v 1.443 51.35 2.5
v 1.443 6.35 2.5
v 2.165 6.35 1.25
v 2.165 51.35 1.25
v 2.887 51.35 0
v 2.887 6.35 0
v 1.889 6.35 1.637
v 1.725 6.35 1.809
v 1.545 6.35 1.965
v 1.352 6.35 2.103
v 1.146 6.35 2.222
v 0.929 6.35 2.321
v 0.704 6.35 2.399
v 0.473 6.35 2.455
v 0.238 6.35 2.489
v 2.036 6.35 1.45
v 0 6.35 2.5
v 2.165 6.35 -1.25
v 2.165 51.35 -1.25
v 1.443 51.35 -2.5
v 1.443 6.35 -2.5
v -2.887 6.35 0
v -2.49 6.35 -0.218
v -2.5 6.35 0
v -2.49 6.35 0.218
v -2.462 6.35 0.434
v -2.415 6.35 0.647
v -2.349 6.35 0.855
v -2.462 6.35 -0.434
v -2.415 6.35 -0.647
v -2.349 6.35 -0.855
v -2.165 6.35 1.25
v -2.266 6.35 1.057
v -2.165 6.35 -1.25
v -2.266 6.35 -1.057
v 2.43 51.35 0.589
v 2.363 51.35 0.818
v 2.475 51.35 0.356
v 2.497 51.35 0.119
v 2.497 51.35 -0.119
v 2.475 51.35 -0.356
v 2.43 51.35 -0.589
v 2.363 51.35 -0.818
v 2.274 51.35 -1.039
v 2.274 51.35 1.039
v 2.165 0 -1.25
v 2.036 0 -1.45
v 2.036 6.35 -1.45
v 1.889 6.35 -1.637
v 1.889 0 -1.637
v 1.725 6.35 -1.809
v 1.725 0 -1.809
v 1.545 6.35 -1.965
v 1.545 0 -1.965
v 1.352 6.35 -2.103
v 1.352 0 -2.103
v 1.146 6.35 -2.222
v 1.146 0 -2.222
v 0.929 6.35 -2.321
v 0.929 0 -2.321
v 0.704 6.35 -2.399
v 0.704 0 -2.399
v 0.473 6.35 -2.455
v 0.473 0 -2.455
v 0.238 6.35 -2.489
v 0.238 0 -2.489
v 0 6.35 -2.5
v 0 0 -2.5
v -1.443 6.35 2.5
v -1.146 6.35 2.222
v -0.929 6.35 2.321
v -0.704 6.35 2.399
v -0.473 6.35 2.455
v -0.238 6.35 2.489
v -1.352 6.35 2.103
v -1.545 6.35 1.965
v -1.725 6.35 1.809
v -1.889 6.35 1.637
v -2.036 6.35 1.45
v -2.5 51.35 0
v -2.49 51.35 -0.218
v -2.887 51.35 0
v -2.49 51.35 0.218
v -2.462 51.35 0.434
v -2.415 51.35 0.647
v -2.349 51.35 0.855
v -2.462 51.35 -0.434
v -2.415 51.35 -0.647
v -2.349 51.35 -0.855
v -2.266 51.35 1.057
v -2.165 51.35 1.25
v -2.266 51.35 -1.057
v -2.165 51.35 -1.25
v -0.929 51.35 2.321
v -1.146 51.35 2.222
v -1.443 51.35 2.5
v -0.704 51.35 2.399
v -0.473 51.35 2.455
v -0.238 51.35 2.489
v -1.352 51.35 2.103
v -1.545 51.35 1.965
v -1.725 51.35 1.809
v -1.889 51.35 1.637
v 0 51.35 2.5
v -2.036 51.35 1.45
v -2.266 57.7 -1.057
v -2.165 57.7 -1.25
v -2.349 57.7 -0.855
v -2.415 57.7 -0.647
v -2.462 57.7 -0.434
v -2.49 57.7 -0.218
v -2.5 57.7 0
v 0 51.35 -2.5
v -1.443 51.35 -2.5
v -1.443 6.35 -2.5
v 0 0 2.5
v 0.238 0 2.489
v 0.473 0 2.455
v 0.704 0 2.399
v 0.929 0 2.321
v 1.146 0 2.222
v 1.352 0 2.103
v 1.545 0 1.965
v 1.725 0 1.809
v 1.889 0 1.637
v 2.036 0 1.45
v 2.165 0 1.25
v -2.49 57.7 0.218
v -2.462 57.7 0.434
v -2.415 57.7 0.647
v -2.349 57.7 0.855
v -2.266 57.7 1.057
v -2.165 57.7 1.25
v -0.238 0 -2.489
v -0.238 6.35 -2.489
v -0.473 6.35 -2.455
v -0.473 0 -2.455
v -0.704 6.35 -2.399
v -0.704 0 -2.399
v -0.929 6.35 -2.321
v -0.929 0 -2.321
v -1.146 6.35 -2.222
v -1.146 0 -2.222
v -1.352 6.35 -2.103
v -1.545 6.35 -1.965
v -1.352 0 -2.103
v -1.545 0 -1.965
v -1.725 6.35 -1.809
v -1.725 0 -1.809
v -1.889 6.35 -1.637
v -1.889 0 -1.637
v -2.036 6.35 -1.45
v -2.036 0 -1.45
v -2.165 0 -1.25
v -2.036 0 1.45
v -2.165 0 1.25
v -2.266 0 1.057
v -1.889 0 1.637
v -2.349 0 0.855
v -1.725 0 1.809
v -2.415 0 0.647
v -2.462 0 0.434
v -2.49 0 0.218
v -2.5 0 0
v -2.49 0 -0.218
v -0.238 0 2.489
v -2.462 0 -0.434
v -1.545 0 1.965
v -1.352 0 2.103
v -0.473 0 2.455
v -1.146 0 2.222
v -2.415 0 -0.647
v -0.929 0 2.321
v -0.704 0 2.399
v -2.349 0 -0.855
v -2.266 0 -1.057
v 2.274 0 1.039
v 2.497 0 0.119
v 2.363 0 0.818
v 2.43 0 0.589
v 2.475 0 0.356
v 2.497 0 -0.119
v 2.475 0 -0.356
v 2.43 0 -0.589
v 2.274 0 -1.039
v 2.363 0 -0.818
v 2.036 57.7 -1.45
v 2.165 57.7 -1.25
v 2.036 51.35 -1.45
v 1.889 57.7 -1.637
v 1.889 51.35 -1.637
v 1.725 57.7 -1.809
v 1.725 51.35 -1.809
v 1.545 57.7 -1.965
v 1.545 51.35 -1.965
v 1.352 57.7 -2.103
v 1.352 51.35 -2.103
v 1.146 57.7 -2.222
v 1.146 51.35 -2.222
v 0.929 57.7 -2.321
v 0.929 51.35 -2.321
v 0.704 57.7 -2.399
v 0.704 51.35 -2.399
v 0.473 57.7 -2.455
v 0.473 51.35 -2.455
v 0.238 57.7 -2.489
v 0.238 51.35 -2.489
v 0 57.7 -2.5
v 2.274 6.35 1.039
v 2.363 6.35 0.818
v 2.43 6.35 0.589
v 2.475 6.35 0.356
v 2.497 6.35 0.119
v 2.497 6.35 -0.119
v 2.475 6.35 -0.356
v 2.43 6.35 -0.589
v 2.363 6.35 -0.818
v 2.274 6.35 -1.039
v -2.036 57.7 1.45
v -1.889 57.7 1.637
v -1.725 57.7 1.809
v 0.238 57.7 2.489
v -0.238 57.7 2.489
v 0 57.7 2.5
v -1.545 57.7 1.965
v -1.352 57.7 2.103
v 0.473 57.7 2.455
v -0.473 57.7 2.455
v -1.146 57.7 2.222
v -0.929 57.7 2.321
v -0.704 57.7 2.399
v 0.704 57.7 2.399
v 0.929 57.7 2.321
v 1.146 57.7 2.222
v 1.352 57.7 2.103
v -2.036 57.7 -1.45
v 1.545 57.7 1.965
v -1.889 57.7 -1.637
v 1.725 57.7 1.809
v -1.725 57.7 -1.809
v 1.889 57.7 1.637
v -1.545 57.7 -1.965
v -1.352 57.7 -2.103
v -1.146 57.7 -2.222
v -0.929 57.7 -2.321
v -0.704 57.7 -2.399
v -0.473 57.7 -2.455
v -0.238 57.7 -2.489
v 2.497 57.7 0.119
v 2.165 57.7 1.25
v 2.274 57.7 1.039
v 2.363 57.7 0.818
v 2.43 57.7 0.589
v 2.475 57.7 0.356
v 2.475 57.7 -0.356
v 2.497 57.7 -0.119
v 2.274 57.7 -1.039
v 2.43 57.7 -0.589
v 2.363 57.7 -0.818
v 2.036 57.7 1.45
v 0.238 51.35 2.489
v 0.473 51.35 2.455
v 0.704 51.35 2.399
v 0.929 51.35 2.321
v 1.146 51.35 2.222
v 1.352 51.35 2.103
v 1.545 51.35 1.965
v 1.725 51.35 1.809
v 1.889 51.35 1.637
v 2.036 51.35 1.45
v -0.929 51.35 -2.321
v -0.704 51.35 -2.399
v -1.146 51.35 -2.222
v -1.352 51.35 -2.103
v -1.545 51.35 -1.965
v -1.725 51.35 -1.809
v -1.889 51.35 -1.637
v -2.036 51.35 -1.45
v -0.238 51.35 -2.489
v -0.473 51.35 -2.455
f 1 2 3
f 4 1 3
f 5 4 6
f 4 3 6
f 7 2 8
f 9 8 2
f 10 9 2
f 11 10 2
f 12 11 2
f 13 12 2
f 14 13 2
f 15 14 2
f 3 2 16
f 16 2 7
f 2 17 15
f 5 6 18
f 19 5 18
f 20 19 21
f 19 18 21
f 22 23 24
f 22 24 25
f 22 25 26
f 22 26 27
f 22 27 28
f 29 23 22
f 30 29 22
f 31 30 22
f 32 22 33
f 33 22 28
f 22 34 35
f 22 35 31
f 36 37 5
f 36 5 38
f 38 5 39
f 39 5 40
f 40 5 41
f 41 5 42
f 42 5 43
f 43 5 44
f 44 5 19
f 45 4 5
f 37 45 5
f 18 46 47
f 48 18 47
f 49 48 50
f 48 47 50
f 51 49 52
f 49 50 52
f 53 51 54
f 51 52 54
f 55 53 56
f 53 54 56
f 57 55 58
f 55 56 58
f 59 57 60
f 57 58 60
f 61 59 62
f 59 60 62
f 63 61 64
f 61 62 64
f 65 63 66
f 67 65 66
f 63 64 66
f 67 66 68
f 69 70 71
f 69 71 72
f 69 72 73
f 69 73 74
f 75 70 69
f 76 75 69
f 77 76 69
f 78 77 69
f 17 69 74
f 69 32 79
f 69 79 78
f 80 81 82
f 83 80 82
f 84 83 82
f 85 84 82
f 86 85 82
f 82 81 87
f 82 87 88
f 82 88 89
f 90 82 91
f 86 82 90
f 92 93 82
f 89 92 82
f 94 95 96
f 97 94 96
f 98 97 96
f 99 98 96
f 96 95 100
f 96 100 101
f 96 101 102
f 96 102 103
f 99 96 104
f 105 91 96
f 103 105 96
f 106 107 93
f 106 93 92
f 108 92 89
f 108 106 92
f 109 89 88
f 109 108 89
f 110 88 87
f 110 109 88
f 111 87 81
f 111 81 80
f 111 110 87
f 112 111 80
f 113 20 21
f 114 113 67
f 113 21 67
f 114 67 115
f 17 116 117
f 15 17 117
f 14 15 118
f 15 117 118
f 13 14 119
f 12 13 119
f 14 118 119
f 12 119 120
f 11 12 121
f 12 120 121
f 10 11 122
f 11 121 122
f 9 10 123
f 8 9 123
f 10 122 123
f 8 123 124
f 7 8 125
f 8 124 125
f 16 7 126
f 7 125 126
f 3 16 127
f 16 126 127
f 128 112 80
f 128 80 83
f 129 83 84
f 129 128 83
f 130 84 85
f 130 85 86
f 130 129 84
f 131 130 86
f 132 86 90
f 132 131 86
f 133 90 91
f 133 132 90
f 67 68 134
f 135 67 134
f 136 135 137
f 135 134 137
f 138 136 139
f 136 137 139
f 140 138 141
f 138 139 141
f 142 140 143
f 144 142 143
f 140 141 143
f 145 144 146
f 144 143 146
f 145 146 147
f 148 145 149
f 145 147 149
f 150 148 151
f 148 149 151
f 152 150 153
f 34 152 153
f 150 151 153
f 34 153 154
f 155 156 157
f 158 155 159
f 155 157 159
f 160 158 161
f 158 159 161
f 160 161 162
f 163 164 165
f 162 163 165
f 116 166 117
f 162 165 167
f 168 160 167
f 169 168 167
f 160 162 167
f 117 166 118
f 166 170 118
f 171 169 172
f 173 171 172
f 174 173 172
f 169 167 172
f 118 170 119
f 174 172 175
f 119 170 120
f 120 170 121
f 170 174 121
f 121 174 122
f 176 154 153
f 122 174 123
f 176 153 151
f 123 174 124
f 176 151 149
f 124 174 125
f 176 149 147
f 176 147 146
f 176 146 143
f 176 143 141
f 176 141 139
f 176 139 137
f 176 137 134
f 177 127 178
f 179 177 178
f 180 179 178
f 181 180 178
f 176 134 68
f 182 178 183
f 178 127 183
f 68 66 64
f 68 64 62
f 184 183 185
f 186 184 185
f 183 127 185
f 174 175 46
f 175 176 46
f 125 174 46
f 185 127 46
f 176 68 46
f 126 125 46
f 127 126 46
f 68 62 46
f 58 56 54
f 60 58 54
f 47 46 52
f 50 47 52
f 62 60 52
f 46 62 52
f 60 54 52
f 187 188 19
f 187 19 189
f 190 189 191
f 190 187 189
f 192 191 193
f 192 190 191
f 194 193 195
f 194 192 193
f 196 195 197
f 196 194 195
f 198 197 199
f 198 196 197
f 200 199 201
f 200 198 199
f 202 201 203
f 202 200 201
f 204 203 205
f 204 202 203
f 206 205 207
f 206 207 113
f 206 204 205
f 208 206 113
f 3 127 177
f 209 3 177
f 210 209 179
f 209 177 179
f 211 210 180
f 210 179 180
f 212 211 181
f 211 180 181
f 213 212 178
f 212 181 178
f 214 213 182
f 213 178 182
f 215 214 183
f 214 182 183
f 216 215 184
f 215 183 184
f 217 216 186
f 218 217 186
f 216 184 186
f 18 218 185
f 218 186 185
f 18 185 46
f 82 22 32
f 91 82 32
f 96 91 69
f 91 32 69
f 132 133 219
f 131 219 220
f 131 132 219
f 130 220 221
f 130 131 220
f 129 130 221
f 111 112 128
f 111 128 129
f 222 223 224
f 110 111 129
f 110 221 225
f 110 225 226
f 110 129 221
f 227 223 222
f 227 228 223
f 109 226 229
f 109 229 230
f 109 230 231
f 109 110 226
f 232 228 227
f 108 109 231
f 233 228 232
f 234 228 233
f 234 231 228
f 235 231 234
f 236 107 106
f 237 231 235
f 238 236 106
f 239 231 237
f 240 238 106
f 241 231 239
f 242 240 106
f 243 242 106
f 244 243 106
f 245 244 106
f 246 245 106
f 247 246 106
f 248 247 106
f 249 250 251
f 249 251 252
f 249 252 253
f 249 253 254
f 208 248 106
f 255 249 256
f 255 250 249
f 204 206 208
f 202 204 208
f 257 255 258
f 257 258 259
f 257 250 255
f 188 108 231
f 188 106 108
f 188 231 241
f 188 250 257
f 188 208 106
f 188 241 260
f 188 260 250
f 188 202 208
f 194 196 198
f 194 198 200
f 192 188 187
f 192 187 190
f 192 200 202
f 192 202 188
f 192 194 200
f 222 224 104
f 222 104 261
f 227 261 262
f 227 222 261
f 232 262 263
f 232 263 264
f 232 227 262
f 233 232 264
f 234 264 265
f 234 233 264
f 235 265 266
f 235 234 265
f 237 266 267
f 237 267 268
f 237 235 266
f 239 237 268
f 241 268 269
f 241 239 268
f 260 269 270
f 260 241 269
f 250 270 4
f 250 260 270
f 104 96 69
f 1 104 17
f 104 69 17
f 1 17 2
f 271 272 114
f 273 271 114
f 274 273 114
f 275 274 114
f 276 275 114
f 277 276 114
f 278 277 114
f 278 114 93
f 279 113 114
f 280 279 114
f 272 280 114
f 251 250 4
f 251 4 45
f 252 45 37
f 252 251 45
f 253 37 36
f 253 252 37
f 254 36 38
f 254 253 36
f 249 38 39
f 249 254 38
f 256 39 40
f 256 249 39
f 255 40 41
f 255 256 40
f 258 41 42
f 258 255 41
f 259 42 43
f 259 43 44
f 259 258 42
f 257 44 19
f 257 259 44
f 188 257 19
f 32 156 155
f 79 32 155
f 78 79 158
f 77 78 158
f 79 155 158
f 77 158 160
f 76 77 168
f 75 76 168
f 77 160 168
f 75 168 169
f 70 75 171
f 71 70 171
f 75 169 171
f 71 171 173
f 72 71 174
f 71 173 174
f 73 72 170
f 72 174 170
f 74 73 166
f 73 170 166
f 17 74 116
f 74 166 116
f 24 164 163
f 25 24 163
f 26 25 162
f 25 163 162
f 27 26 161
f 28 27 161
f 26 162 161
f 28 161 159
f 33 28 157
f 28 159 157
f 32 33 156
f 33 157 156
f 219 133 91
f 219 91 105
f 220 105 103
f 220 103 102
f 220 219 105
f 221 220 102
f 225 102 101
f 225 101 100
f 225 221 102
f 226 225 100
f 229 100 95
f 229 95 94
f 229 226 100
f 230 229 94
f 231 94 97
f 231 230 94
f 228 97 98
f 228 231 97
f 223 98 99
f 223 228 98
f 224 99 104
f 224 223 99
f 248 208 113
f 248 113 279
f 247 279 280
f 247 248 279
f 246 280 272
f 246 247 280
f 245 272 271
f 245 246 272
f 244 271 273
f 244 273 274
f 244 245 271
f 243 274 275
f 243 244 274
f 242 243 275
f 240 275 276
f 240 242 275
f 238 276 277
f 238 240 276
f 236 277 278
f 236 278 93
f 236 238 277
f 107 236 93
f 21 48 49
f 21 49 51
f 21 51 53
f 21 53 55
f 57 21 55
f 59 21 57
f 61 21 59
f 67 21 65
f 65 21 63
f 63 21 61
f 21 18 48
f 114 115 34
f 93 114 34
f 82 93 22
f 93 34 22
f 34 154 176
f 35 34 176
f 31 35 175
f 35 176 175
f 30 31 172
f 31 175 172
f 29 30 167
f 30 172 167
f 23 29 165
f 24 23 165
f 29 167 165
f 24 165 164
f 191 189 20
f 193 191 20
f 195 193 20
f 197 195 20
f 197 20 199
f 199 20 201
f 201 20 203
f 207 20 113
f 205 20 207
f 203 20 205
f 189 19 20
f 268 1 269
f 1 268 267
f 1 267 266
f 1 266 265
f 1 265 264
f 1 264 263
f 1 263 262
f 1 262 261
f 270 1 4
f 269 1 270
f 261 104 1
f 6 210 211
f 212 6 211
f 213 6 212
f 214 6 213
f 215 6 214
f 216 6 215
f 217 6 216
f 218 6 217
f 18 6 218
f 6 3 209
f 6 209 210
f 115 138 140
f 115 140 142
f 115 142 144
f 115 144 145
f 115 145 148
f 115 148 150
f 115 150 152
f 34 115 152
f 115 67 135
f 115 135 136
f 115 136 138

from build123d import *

# Parameters (mm, degrees)
BOSS_EXTRUDE1_DEPTH = 57.699999944
CUT_EXTRUDE1_DEPTH  = 6.35


with BuildPart() as part:
    # Sketch1 → Boss-Extrude1 (new body)
    with BuildSketch(Plane(origin=(0, 0, 0), x_dir=(1, 0, 0), z_dir=(0, 1, 0))):
        Polygon((2.886751346, 0), (1.443375673, 2.5), (-1.443375673, 2.5), (-2.886751346, 0), (-1.443375673, -2.5), (1.443375673, -2.5), align=None)
    extrude(amount=BOSS_EXTRUDE1_DEPTH)

    # Sketch2 → Cut-Extrude1 (cut)
    with BuildSketch(Plane(origin=(0, 0, 0), x_dir=(-1, 0, 0), z_dir=(0, -1, 0))):
        with BuildLine():
            Line((-2.16506344, -1.25000012), (-1.443375673, -2.5))
            Line((-1.443375673, -2.5), (0, -2.5))
            ThreePointArc((0, -2.5), (-1.24999994, -2.165063544), (-2.16506344, -1.25000012))
        make_face()
        with BuildLine():
            Line((0, -2.5), (1.443375673, -2.5))
            Line((1.443375673, -2.5), (2.165063522, -1.249999979))
            ThreePointArc((2.165063522, -1.249999979), (1.250000011, -2.165063503), (0, -2.5))
        make_face()
        with BuildLine():
            Line((2.165063522, -1.249999979), (2.886751346, 0))
            Line((2.886751346, 0), (2.165063508, 1.250000002))
            ThreePointArc((2.165063508, 1.250000002), (2.414814565, 0.647047614), (2.5, 0))
            ThreePointArc((2.5, 0), (2.414814569, -0.647047601), (2.165063522, -1.249999979))
        make_face()
        with BuildLine():
            Line((2.165063508, 1.250000002), (1.443375673, 2.5))
            Line((1.443375673, 2.5), (0, 2.5))
            ThreePointArc((0, 2.5), (1.249999999, 2.16506351), (2.165063508, 1.250000002))
        make_face()
        with BuildLine():
            Line((-2.165063434, 1.25000013), (-2.886751346, 0))
            Line((-2.886751346, 0), (-2.16506344, -1.25000012))
            ThreePointArc((-2.16506344, -1.25000012), (-2.5, 6e-09), (-2.165063434, 1.25000013))
        make_face()
        with BuildLine():
            Line((0, 2.5), (-1.443375673, 2.5))
            Line((-1.443375673, 2.5), (-2.165063434, 1.25000013))
            ThreePointArc((-2.165063434, 1.25000013), (-1.249999935, 2.165063547), (0, 2.5))
        make_face()
    cut_extrude1 = extrude(amount=-CUT_EXTRUDE1_DEPTH, mode=Mode.SUBTRACT)

    # Mirror1: Cut-Extrude1 across plane
    add(cut_extrude1.mirror(Plane(origin=(0, 28.849999972, 0), x_dir=(0, 0, 1), z_dir=(0, -1, 0))), mode=Mode.SUBTRACT)


solid = part.part
